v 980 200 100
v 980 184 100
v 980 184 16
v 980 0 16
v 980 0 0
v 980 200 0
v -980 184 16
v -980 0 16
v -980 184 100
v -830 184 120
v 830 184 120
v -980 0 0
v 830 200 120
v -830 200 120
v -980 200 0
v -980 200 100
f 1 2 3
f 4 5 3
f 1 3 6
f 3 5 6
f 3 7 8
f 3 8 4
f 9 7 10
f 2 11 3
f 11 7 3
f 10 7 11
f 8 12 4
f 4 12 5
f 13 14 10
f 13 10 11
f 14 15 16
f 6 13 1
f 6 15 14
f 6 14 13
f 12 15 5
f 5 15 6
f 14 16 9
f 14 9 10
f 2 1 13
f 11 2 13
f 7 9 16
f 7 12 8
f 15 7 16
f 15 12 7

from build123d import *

# Parameters (mm, degrees)
SKETCH_1_W          = 1960
SKETCH_1_H          = 200
EXTRUDE_1447_DEPTH  = 16
SKETCH_2_W          = 1960
SKETCH_2_H          = 16
EXTRUDE_1_DEPTH     = 104
CUT_EXTRUDE_1_DEPTH = 1008.372820757


with BuildPart() as part:
    # 草图1 → Extrude 1447 (new body)
    with BuildSketch(Plane.XY):
        with Locations((0, 100)):
            Rectangle(SKETCH_1_W, SKETCH_1_H)
    extrude(amount=EXTRUDE_1447_DEPTH)

    # 草图2 → 凸台-拉伸1 (add)
    with BuildSketch(Plane.XY.offset(16)):
        with Locations((0, 192)):
            Rectangle(SKETCH_2_W, SKETCH_2_H)
    extrude(amount=EXTRUDE_1_DEPTH)

    # 草图3 → 切除-拉伸1 (cut, through all)
    with BuildSketch(Plane(origin=(0, 200, 0), x_dir=(-1, 0, 0), z_dir=(0, 1, 0))):
        Polygon((-980, 100), (-830, 120), (-980, 120), align=None)
        Polygon((980, 100), (830, 120), (980, 120), align=None)
    extrude(amount=-CUT_EXTRUDE_1_DEPTH, mode=Mode.SUBTRACT)


solid = part.part
